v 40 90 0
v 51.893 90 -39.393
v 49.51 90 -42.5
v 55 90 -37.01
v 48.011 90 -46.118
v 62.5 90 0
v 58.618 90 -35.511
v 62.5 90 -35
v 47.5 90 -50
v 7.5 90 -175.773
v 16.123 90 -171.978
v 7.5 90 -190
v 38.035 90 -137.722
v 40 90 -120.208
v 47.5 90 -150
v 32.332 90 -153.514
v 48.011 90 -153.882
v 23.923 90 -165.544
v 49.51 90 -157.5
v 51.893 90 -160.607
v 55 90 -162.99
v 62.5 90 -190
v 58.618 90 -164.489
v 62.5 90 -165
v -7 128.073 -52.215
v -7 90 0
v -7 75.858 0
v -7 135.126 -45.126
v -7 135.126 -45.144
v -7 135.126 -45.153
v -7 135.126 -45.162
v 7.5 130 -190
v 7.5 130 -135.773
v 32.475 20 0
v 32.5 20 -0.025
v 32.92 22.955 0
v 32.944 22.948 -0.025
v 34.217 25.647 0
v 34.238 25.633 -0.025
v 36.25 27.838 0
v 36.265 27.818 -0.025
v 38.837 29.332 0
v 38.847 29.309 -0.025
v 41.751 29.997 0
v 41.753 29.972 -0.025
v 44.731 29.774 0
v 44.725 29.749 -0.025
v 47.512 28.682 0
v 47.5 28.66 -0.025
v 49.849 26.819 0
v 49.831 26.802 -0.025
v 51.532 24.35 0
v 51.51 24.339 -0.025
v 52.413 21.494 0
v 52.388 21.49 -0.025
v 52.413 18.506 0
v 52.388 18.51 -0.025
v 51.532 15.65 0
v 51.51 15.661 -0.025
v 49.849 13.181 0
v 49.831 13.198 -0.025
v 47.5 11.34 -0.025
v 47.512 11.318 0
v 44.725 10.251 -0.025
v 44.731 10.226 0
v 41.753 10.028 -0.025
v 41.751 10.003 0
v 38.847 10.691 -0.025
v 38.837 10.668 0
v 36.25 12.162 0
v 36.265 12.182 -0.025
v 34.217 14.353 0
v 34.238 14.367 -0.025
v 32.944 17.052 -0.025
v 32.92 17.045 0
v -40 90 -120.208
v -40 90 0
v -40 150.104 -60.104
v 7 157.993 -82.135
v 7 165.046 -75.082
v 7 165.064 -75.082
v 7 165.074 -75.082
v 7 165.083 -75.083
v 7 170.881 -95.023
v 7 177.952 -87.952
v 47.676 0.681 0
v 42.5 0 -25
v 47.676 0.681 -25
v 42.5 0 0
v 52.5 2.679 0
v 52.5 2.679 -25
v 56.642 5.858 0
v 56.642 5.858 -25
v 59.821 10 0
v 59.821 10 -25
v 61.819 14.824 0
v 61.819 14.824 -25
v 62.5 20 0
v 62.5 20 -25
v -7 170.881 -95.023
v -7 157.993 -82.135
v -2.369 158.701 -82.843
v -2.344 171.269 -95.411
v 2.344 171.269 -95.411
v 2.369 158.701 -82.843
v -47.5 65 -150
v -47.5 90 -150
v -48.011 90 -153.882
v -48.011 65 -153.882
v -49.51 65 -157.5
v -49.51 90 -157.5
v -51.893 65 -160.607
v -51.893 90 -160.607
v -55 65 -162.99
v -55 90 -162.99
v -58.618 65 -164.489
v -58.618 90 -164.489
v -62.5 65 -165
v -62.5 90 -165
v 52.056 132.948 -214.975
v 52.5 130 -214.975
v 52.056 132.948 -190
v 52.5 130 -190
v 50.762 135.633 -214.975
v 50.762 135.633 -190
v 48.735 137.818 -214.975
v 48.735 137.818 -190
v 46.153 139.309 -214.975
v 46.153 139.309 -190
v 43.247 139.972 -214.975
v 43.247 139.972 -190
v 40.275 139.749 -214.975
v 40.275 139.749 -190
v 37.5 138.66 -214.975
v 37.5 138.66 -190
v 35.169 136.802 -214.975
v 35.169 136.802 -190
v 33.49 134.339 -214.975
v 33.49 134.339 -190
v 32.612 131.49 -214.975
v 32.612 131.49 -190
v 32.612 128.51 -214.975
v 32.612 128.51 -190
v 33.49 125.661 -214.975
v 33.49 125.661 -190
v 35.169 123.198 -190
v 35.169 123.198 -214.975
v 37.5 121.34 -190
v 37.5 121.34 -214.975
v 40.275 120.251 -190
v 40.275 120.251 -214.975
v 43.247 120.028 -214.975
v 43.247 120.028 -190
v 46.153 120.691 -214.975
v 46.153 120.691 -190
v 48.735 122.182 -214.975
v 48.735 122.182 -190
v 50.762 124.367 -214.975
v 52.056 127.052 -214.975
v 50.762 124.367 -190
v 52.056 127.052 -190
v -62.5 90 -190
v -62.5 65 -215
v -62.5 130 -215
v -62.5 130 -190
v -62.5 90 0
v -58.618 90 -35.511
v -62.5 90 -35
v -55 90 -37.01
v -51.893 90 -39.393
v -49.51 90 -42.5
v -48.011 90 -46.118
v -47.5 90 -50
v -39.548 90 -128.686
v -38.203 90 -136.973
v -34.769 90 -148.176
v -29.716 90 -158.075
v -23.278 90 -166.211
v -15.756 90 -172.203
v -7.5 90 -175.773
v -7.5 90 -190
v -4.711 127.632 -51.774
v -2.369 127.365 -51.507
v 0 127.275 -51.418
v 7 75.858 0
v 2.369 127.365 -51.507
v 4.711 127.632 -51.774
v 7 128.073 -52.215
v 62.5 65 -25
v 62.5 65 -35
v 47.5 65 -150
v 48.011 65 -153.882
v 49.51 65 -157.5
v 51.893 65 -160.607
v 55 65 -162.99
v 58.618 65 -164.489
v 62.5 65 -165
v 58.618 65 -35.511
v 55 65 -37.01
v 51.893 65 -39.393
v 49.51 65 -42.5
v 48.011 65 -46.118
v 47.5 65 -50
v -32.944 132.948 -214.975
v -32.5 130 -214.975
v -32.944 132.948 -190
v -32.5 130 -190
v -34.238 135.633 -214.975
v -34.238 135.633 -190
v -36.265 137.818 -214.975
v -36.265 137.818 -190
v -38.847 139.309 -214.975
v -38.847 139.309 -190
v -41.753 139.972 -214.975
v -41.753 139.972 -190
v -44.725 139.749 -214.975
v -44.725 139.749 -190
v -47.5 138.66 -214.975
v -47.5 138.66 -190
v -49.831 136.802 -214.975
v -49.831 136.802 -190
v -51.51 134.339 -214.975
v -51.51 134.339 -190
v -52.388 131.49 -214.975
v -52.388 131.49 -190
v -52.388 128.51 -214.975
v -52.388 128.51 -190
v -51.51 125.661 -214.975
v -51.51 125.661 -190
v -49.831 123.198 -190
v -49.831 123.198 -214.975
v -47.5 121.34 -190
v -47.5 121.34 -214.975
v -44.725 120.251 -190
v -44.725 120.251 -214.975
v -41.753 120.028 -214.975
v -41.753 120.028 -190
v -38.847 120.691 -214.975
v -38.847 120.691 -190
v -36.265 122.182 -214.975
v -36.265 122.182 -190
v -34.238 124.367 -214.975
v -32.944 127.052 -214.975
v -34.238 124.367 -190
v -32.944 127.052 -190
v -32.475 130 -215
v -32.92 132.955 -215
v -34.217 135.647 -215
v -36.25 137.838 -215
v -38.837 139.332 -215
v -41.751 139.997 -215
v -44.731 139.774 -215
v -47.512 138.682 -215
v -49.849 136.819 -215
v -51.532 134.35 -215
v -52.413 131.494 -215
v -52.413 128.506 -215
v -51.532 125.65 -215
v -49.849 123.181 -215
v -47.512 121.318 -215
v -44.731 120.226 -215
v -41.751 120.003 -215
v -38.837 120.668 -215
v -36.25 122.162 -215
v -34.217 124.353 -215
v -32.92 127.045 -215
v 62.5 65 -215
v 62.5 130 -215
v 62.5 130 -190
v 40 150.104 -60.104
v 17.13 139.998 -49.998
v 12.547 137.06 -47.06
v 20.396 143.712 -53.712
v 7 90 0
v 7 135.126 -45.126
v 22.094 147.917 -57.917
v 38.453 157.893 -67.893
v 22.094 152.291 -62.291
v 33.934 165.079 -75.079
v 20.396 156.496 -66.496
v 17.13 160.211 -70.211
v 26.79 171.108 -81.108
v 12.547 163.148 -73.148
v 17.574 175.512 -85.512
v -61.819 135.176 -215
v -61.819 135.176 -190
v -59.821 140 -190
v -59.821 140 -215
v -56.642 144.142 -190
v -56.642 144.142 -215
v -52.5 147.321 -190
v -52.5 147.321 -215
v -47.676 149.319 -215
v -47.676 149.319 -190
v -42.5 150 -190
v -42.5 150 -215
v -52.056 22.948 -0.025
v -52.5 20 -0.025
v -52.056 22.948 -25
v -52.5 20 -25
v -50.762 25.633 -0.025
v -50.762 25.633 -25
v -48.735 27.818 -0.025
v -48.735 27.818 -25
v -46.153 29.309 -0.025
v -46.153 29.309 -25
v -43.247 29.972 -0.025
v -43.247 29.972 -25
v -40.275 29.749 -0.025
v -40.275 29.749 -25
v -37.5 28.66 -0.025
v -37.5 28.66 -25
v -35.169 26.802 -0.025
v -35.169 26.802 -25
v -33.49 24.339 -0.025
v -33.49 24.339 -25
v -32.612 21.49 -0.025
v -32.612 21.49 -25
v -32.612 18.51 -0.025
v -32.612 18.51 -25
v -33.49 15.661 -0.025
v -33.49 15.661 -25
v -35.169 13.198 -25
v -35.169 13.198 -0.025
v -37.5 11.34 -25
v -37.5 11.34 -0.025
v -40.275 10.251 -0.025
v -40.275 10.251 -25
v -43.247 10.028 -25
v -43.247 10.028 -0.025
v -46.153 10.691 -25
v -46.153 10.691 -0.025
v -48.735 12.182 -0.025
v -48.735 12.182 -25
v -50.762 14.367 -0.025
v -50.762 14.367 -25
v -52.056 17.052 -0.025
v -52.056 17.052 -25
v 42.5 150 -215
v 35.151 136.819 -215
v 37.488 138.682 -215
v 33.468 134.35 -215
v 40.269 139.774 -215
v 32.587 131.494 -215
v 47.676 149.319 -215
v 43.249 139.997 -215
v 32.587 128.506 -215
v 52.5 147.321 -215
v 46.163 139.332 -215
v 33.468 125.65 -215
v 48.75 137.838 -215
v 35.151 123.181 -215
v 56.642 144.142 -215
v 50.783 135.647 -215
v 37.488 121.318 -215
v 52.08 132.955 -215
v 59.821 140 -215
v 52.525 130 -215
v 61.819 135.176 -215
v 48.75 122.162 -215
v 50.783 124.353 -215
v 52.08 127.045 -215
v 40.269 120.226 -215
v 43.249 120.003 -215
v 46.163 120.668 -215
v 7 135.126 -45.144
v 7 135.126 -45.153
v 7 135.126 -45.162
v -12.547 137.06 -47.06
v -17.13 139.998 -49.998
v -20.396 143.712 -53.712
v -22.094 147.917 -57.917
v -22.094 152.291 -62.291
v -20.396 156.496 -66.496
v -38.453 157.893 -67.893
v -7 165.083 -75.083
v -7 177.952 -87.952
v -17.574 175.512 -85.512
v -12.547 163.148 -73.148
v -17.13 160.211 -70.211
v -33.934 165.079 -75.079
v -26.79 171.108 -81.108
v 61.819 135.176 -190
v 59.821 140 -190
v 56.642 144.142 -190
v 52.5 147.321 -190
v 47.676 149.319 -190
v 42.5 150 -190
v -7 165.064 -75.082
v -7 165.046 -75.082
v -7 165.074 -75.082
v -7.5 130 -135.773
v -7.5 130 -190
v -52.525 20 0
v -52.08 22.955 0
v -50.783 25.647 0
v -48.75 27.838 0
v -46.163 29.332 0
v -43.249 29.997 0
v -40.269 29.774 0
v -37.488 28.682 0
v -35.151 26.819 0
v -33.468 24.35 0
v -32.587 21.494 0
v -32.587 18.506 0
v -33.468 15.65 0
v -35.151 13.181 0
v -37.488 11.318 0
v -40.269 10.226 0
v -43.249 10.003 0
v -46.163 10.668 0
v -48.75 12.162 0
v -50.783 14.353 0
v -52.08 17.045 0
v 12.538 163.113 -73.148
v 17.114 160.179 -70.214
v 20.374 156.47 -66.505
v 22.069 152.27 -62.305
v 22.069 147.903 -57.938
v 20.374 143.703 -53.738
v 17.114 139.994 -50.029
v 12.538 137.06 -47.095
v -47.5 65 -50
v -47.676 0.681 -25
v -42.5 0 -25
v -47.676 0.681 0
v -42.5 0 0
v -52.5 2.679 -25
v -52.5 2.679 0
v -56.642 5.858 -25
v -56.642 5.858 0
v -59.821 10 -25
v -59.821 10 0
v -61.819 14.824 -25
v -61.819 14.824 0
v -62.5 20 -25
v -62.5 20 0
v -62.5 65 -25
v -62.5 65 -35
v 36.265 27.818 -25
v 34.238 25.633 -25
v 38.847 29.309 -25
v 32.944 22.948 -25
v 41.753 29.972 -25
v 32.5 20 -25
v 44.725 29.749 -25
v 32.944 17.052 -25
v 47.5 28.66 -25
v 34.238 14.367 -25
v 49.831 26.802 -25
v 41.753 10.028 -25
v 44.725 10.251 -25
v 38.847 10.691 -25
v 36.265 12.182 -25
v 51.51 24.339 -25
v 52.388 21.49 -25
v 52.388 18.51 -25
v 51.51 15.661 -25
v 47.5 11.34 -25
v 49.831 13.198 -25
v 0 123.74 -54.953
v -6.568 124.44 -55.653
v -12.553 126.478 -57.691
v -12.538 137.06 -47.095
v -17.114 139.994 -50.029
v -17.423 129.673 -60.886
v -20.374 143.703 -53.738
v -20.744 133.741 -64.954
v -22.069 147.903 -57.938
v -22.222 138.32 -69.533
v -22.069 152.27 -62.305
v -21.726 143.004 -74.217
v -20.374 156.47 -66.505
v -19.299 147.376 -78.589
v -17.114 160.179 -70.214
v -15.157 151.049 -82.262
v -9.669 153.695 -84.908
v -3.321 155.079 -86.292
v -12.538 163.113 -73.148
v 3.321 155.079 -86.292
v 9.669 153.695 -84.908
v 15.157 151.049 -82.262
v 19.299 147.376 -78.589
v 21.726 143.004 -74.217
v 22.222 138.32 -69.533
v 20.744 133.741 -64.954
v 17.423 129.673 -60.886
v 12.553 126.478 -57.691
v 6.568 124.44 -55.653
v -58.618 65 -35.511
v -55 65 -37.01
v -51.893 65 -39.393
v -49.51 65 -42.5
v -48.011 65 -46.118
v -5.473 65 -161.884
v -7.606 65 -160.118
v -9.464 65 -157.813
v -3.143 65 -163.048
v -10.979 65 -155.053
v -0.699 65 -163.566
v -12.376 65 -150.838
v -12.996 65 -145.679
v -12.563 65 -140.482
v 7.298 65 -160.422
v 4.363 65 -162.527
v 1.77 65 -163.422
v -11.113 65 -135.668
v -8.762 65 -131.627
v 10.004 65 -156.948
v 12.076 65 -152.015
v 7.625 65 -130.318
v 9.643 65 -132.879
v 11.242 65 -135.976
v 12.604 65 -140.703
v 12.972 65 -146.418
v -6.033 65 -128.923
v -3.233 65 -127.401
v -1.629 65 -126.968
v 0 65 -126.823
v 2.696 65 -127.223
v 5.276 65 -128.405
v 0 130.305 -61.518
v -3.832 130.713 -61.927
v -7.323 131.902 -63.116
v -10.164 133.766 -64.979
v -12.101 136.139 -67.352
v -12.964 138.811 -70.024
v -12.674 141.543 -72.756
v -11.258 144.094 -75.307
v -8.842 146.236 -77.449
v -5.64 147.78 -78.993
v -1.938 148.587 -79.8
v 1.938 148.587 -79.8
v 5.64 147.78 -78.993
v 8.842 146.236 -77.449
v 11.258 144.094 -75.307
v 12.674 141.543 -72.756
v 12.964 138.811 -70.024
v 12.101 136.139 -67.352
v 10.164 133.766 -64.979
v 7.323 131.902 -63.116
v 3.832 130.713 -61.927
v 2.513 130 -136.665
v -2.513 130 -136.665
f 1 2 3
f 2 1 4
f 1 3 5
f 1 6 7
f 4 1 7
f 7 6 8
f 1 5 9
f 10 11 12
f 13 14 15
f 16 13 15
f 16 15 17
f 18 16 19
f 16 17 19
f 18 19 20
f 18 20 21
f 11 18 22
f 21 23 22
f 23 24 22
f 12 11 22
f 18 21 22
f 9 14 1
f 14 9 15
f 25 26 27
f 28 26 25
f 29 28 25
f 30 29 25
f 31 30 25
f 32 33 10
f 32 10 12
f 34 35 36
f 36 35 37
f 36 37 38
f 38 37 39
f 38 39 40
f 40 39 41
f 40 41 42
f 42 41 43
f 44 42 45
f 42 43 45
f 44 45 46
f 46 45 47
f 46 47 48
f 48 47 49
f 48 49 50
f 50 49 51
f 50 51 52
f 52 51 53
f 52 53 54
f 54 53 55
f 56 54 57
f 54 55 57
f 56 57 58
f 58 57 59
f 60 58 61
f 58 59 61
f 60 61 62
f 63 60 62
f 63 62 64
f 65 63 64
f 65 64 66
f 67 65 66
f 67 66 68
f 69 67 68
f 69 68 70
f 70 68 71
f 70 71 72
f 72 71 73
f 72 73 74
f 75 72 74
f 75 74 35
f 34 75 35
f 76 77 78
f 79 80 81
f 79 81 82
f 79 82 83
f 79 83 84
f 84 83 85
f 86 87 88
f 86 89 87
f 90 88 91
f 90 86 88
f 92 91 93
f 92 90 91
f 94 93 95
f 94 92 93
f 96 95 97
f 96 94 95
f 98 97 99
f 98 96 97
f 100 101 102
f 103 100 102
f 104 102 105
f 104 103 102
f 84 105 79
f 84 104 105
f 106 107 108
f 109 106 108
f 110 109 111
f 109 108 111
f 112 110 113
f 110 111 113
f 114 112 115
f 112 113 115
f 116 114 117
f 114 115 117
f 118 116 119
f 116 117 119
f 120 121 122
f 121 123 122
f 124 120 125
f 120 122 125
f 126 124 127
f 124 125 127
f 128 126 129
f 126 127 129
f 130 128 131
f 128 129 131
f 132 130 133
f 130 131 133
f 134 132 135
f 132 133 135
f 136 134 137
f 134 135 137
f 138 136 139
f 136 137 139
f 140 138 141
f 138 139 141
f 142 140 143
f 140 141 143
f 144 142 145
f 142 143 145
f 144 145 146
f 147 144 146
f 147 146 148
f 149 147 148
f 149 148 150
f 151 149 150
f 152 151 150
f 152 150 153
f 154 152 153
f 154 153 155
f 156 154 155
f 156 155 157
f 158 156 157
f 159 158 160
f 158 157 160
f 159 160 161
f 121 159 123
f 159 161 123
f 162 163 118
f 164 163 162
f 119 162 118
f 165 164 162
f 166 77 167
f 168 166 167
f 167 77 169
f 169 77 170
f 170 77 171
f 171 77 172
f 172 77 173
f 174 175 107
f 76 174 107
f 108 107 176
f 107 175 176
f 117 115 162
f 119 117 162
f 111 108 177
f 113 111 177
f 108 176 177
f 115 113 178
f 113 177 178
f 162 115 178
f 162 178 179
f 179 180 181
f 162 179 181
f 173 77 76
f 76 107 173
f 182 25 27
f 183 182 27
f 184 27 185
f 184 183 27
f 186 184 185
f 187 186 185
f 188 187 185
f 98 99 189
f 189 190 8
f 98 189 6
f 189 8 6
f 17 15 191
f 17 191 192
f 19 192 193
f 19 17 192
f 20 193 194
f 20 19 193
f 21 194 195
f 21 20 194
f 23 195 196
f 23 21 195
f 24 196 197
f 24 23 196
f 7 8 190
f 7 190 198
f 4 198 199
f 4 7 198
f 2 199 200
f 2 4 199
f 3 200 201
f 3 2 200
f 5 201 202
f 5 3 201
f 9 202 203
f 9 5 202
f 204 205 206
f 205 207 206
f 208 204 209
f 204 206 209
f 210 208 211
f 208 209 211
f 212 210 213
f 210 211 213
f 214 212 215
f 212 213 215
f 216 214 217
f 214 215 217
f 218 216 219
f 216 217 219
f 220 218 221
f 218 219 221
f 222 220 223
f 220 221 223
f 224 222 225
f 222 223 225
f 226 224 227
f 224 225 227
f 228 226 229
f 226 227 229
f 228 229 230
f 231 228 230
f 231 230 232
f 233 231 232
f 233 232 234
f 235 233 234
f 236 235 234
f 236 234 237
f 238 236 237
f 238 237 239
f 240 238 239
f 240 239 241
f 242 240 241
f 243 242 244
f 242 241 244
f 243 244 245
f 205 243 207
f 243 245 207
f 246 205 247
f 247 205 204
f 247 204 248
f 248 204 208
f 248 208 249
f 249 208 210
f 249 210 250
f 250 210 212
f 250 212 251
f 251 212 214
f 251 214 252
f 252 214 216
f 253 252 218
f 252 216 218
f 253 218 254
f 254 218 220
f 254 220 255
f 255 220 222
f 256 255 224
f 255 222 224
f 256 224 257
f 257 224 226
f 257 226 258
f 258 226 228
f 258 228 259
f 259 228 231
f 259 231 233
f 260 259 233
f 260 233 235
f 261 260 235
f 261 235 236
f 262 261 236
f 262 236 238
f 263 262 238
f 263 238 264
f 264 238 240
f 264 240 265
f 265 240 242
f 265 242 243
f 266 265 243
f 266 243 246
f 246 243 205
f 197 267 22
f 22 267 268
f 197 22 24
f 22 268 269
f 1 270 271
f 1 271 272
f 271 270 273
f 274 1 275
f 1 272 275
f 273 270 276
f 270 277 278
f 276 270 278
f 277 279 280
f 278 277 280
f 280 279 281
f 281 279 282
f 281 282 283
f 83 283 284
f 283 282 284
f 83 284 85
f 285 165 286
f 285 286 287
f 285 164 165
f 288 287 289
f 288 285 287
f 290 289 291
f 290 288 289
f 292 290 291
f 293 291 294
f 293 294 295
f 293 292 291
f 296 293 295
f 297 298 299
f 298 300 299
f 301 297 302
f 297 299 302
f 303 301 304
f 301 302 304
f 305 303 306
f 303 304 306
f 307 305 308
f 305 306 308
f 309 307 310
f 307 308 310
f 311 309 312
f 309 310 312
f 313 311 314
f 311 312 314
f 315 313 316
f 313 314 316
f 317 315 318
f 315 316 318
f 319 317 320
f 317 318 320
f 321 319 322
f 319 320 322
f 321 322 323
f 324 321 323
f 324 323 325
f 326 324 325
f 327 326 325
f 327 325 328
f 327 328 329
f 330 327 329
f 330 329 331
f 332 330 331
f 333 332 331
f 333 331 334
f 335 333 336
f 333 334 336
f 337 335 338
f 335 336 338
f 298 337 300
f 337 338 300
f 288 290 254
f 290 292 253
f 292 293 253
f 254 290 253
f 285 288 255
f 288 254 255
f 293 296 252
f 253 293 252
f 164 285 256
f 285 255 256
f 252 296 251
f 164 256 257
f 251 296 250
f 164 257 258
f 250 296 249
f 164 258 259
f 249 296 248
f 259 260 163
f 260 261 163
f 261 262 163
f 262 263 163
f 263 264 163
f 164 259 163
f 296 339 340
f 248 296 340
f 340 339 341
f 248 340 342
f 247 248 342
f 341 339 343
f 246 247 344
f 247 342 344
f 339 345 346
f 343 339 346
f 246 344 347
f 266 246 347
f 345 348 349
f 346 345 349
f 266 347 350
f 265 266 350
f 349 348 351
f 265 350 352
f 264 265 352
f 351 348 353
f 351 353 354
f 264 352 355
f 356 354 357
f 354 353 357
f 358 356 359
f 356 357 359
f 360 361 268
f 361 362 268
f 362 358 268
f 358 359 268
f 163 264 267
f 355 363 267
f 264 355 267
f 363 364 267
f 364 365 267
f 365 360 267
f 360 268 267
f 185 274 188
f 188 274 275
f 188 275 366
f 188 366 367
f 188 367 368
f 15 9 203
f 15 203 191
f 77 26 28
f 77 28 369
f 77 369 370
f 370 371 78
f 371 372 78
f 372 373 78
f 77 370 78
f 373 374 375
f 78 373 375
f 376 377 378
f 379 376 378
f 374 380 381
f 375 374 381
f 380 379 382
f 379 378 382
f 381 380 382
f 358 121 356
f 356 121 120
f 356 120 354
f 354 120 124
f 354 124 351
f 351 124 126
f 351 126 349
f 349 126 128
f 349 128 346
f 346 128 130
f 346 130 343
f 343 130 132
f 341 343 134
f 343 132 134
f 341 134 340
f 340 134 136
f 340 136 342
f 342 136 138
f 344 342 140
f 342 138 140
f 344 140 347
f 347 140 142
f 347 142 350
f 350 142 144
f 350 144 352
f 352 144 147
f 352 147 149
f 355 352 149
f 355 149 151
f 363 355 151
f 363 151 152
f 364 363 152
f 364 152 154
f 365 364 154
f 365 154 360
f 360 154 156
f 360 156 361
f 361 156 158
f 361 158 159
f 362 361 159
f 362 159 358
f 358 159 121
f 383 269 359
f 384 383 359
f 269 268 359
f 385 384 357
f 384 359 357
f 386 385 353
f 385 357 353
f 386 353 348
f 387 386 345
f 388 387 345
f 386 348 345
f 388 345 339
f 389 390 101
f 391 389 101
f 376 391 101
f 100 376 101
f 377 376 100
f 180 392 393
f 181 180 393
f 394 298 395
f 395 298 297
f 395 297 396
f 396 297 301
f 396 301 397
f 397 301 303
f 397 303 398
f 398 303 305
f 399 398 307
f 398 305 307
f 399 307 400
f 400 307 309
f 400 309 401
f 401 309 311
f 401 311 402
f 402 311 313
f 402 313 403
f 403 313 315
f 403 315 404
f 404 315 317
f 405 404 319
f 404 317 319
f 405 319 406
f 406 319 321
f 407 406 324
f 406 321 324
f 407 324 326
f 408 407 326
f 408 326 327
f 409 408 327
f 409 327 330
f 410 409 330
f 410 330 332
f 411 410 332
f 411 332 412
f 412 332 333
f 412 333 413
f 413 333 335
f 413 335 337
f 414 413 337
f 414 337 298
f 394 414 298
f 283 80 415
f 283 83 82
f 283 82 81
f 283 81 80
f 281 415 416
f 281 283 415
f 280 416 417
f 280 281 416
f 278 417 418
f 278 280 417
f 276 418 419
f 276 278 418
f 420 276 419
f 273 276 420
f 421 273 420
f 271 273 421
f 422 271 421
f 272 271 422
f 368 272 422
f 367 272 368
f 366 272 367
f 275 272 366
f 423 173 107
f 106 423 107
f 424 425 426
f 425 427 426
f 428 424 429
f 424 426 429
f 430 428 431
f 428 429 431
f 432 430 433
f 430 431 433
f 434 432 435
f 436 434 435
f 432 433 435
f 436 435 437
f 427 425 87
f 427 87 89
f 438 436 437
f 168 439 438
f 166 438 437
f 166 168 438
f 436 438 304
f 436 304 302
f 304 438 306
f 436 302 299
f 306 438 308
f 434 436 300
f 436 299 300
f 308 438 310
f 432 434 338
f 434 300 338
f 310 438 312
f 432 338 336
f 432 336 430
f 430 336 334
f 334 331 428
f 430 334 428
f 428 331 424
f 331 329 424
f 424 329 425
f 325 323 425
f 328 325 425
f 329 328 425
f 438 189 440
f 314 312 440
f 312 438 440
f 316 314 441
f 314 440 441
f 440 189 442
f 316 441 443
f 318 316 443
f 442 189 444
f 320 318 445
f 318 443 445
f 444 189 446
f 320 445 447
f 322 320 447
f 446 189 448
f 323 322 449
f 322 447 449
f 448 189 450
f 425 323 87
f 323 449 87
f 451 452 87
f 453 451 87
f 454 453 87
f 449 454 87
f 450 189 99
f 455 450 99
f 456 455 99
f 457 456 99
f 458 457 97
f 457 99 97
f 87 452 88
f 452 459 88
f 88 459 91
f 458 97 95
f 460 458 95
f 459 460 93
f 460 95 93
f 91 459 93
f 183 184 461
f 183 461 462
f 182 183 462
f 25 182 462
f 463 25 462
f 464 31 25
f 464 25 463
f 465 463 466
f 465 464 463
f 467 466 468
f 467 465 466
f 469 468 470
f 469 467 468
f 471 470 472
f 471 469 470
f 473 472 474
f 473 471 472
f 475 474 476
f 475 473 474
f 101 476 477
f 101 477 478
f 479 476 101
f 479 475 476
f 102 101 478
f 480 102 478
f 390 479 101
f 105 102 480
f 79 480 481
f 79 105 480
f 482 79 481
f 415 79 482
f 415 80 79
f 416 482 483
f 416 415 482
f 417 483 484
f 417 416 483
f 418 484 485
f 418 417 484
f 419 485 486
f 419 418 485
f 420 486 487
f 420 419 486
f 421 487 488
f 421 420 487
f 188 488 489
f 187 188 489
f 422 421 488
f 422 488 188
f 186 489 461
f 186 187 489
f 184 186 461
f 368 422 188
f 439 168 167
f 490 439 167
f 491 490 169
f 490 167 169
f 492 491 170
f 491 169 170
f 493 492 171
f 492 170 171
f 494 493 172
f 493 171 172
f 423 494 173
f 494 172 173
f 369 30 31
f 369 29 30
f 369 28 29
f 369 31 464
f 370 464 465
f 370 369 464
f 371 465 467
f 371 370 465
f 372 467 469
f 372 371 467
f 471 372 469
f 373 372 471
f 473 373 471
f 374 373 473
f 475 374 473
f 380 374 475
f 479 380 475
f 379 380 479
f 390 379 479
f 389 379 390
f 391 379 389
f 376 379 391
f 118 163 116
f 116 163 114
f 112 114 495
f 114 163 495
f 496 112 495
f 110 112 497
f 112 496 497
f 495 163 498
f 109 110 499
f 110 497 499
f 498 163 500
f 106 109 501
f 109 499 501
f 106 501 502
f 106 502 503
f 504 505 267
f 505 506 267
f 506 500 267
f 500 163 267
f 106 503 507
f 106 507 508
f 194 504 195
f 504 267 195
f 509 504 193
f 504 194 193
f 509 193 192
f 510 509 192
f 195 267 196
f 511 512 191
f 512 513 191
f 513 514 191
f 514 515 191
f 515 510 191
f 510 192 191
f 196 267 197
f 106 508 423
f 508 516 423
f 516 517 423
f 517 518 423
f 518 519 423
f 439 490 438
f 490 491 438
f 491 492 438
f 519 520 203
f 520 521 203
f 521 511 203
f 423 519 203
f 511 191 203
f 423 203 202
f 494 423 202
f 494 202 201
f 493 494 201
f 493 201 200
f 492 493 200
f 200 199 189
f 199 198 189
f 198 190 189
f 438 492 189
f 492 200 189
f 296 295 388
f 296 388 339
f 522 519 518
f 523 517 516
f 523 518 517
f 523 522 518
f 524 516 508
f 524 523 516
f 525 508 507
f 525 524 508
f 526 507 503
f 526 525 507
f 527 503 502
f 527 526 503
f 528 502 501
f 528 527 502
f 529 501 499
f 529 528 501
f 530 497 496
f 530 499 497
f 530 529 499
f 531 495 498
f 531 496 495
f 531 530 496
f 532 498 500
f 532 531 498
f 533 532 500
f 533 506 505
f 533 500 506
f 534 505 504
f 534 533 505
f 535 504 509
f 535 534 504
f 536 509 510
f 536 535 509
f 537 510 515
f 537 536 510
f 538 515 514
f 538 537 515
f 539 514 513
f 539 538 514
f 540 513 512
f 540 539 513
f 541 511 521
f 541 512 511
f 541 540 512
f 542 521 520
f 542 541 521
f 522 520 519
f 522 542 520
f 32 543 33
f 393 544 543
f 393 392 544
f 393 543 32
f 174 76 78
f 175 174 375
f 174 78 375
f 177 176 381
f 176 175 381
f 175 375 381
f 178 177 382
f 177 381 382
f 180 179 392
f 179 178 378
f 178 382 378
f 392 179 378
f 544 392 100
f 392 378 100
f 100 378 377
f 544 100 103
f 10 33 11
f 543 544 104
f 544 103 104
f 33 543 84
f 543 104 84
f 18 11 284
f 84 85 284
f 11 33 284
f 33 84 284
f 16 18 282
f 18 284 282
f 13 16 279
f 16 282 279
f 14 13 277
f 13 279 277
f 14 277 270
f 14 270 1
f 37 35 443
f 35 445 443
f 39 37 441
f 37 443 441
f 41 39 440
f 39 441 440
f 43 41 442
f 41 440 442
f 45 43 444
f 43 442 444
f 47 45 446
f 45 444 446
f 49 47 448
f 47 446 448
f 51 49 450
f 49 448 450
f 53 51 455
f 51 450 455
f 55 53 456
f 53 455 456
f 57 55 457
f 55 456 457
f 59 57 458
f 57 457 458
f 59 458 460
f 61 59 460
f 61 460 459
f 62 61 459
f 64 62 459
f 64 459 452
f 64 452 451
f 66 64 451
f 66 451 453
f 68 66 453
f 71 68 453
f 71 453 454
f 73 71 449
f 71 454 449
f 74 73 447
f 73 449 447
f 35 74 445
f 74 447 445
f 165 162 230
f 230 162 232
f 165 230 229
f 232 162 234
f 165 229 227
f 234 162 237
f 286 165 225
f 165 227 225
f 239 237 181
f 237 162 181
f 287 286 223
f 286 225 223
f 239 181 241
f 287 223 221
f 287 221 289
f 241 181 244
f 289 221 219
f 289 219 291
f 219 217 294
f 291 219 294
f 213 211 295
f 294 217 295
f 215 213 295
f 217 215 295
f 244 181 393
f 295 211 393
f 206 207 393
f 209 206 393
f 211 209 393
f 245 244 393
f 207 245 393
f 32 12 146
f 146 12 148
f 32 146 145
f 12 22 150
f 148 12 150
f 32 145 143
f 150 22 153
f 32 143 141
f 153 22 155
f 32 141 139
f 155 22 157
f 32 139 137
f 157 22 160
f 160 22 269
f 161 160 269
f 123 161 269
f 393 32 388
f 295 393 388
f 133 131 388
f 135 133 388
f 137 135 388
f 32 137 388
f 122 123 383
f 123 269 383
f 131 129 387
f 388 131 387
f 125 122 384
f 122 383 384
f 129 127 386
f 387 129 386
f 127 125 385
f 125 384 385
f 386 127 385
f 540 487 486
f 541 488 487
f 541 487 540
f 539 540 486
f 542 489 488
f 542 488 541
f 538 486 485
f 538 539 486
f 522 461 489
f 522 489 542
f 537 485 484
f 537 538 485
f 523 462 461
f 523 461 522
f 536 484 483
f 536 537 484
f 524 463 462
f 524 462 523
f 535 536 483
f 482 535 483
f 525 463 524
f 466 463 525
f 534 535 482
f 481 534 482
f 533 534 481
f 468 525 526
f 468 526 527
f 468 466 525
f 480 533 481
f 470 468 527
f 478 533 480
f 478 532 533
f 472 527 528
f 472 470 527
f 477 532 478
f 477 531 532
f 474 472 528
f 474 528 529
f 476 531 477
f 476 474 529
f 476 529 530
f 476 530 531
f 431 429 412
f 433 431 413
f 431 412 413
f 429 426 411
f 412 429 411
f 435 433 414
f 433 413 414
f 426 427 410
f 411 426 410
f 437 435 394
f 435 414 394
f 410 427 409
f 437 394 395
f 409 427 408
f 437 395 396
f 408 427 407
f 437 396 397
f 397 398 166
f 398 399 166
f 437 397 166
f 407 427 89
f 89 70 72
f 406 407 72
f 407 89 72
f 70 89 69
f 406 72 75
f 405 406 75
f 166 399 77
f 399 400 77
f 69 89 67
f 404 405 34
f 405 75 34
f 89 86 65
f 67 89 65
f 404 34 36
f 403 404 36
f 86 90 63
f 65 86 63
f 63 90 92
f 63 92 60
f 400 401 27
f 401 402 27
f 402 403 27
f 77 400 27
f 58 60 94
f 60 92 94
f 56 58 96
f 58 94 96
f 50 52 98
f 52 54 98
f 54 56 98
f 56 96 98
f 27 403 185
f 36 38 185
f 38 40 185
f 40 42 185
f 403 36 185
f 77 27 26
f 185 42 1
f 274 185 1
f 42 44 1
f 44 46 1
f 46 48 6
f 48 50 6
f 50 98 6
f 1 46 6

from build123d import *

# Parameters (mm, degrees)
BOSS_EXTRUDE1_DEPTH                  = 62.5
BOSS_EXTRUDE2_REACH                  = 289.283
SKETCH6_W                            = 14
SKETCH6_H                            = 267.143428259
CUT_EXTRUDE1_DEPTH                   = 10
RIB1_REACH                           = 288.004
SKETCH7_WALL_W                       = 627.230719128
SKETCH7_WALL_H                       = 15
FILLET1_R                            = 20
CUT_EXTRUDE2_DEPTH                   = 30
F_20_0_20_DIAMETER_HOLE1_D           = 20
F_20_0_20_DIAMETER_HOLE1_CSINK_D     = 20.05
F_20_0_20_DIAMETER_HOLE1_CSINK_ANGLE = 90
F_20_0_20_DIAMETER_HOLE2_D           = 20
F_20_0_20_DIAMETER_HOLE2_DEPTH       = 40
F_20_0_20_DIAMETER_HOLE2_CSINK_D     = 20.05
F_20_0_20_DIAMETER_HOLE2_CSINK_ANGLE = 90
F_20_0_20_DIAMETER_HOLE2_TIP         = 6.00860619


with BuildPart() as part:
    # Sketch1 → Boss-Extrude1 (new, symmetric)
    with BuildSketch(Plane(origin=(0, 0, 0), x_dir=(0, 0, -1), z_dir=(1, 0, 0))):
        Polygon((0, 0), (0, 90), (190, 90), (190, 150), (215, 150), (215, 65), (25, 65), (25, 0), align=None)
    extrude(amount=BOSS_EXTRUDE1_DEPTH, both=True)

    # Boss-Extrude2: up to this face of the body (flat: up to its plane)
    boss_extrude2_end = Plane(part.part.faces().sort_by_distance((0, 90, -95))[0])
    # Sketch2 → Boss-Extrude2 (add, up to the picked face)
    with BuildSketch(Plane(origin=(0, 45, 45), x_dir=(1, 0, 0), z_dir=(0, 0.7071067811865464, 0.7071067811865488)), mode=Mode.PRIVATE) as boss_extrude2_sk1:
        with BuildLine():
            Line((-40, 63.639610307), (-40, 148.639610307))
            ThreePointArc((-40, 148.639610307), (0, 188.639610307), (40, 148.639610307))
            Line((40, 148.639610307), (40, 63.639610307))
            Line((40, 63.639610307), (-40, 63.639610307))
        make_face()
    boss_extrude2_tool1 = split(extrude(boss_extrude2_sk1.sketch, amount=-BOSS_EXTRUDE2_REACH, mode=Mode.PRIVATE), bisect_by=boss_extrude2_end, keep=Keep.BOTH, mode=Mode.PRIVATE)
    add(boss_extrude2_tool1.solids().sort_by(Axis((0, 131.401312, -41.401312), (0, -0.7071067811865464, -0.7071067811865488)))[0])

    # Sketch5 → CBORE for M24 Hex Head Bolt1 (revolve, cut)
    with BuildSketch(Plane(origin=(0, 150.104076401, -60.104076401), x_dir=(0, -0.7071067811865487, 0.7071067811865465), z_dir=(1, 0, 0))):
        Polygon((0, 0), (0, 215.667568262), (13, 215.667568262), (13, 15), (22.2845, 15), (22.2845, 0.025), (22.3095, 0), align=None)
    revolve(axis=Axis((0, 154.594204461, -55.61394834), (0, -0.7071067811865465, -0.7071067811865486)), mode=Mode.SUBTRACT)

    # Sketch6 → Cut-Extrude1 (cut)
    with BuildSketch(Plane(origin=(0, 45, 45), x_dir=(1, 0, 0), z_dir=(0, 0.7071067811865465, 0.7071067811865487))):
        with Locations((0, 148.639610307)):
            Rectangle(SKETCH6_W, SKETCH6_H)
    extrude(amount=-CUT_EXTRUDE1_DEPTH, mode=Mode.SUBTRACT)

    # Sketch7 wall → Rib1 (add, up to next)
    with BuildSketch(Plane(origin=(0, 130, -163.388347649), x_dir=(0, 0, -1), z_dir=(0, 1, 0)), mode=Mode.PRIVATE) as rib1_sk1:
        Rectangle(SKETCH7_WALL_W, SKETCH7_WALL_H)
    rib1_tool1 = extrude(rib1_sk1.sketch, amount=-RIB1_REACH, mode=Mode.PRIVATE) - part.part
    add(rib1_tool1.solids().sort_by_distance((0, 130, -163.388347649))[0])

    # Fillet1
    fillet1_edges = [part.edges().sort_by_distance(p)[0] for p in [
        (62.5, 0, -12.5),
        (-62.5, 150, -202.5),
        (-62.5, 0, -12.5),
        (62.5, 150, -202.5),
    ]]
    fillet(fillet1_edges, radius=FILLET1_R)

    # Sketch8 → Cut-Extrude2 (cut)
    with BuildSketch(Plane(origin=(0, 90, 0), x_dir=(1, 0, 0), z_dir=(0, 1, 0))):
        with BuildLine():
            Line((77.5, 150), (77.5, 50))
            ThreePointArc((77.5, 50), (62.5, 35), (47.5, 50))
            Line((47.5, 50), (47.5, 150))
            ThreePointArc((47.5, 150), (62.5, 165), (77.5, 150))
        make_face()
        with BuildLine():
            Line((-77.5, 150), (-77.5, 50))
            ThreePointArc((-77.5, 50), (-62.5, 35), (-47.5, 50))
            Line((-47.5, 50), (-47.5, 150))
            ThreePointArc((-47.5, 150), (-62.5, 165), (-77.5, 150))
        make_face()
    extrude(amount=-CUT_EXTRUDE2_DEPTH, mode=Mode.SUBTRACT)

    # Ø20.0 (20) Diameter Hole1 (through all)
    with Locations(Plane.XY):
        with Locations((42.5, 20), (-42.5, 20)):
            CounterSinkHole(F_20_0_20_DIAMETER_HOLE1_D / 2, F_20_0_20_DIAMETER_HOLE1_CSINK_D / 2, counter_sink_angle=F_20_0_20_DIAMETER_HOLE1_CSINK_ANGLE)

    # Ø20.0 (20) Diameter Hole2
    with Locations(Plane(origin=(0, 0, -215), x_dir=(-1, 0, 0), z_dir=(0, 0, -1))):
        with Locations((-42.5, 130), (42.5, 130)):
            CounterSinkHole(F_20_0_20_DIAMETER_HOLE2_D / 2, F_20_0_20_DIAMETER_HOLE2_CSINK_D / 2, depth=F_20_0_20_DIAMETER_HOLE2_DEPTH, counter_sink_angle=F_20_0_20_DIAMETER_HOLE2_CSINK_ANGLE)
            with Locations((0, 0, -(F_20_0_20_DIAMETER_HOLE2_DEPTH + F_20_0_20_DIAMETER_HOLE2_TIP / 2))):  # 118° drill point
                Cone(0, F_20_0_20_DIAMETER_HOLE2_D / 2, F_20_0_20_DIAMETER_HOLE2_TIP, mode=Mode.SUBTRACT)


solid = part.part
